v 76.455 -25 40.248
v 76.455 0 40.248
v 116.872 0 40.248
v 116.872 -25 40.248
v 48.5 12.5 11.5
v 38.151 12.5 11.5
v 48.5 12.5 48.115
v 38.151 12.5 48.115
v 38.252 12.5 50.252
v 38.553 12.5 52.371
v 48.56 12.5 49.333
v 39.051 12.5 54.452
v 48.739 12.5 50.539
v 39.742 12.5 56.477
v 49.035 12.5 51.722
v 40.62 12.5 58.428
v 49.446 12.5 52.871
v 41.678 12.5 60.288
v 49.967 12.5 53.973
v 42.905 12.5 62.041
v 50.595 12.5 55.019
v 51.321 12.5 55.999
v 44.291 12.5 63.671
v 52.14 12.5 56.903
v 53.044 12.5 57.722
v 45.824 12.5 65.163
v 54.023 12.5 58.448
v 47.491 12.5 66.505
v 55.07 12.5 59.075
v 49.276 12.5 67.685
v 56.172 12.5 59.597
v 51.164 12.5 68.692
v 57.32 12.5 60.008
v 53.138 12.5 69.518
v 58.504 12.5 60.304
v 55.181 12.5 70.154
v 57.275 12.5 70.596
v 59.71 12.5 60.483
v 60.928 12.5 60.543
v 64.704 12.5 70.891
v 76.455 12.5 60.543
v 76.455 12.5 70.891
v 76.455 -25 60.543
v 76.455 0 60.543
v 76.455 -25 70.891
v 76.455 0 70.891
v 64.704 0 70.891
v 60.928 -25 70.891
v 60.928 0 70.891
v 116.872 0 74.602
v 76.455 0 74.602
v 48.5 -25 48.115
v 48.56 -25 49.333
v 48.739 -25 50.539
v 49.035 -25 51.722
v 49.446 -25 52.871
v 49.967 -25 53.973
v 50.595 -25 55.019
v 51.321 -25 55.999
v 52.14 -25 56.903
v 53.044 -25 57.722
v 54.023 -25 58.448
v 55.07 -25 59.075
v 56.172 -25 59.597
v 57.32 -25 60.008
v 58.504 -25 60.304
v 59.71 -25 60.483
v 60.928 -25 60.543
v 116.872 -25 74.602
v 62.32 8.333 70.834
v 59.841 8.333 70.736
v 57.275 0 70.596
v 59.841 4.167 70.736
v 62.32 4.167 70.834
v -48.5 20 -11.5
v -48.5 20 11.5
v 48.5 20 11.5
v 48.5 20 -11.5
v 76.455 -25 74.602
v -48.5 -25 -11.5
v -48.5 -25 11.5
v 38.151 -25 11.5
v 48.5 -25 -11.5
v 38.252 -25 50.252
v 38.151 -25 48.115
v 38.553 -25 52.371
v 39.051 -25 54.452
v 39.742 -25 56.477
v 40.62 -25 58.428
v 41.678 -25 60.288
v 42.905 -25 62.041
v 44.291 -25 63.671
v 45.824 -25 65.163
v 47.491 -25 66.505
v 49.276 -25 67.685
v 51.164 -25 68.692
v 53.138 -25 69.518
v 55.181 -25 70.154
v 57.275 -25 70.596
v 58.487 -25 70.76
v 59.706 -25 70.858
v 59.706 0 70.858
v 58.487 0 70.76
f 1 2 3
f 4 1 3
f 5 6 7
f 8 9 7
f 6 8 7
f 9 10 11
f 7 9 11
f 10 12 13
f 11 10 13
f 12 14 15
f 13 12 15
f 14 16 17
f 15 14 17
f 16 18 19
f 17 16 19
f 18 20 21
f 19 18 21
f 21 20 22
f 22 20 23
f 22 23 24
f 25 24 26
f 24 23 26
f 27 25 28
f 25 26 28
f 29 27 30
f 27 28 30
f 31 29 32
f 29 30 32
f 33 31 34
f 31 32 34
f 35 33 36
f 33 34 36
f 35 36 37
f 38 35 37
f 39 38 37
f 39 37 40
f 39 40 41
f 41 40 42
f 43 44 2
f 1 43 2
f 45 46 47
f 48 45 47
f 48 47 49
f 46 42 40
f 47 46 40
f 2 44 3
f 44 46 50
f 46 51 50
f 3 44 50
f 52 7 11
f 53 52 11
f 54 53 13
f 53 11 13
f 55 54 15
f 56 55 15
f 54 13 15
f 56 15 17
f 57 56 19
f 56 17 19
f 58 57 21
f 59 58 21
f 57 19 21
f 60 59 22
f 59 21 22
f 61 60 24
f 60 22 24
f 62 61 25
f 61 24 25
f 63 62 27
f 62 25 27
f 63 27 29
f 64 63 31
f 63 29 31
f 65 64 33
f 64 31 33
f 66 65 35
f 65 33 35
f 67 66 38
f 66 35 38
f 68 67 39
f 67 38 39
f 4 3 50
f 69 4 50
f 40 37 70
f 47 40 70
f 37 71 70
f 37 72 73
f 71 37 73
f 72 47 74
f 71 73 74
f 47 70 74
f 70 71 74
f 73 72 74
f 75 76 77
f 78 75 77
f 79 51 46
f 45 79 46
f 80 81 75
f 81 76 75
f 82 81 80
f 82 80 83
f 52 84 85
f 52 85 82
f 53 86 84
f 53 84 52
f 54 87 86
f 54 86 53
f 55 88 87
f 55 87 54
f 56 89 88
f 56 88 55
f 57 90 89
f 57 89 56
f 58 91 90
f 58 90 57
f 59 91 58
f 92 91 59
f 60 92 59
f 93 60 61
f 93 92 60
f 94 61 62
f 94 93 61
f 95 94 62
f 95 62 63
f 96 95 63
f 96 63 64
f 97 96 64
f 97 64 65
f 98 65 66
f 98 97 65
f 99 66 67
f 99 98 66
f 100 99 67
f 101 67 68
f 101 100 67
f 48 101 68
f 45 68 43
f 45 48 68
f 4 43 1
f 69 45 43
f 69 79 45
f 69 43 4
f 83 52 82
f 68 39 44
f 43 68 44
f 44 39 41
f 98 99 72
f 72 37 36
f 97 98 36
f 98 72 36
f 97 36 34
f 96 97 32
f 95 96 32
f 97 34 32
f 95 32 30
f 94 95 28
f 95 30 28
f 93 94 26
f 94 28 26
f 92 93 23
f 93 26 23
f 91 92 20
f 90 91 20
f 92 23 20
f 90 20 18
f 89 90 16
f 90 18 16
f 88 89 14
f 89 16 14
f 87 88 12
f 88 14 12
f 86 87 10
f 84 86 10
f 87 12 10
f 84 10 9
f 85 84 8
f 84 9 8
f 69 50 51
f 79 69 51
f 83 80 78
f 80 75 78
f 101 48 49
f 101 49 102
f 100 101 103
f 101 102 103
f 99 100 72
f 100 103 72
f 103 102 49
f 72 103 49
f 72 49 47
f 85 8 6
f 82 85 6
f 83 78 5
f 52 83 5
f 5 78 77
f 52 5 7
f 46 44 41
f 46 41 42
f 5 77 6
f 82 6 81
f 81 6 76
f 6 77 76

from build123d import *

# Parameters (mm, degrees)
F1_DEPTH = 20
F2_DEPTH = 12.5
F3_DEPTH = 25
F4_DEPTH = 25


with BuildPart() as f1:
    # F0 (on Front) → F1 (new body, symmetric)
    with BuildSketch(Plane.XZ):
        Polygon((48.5, -11.5), (48.5, 11.5), (38.151402, 11.5), (-48.5, 11.5), (-48.5, -11.5), align=None)
    extrude(amount=F1_DEPTH, both=True)

    # F0 (on Front) → F2 (join, symmetric)
    with BuildSketch(Plane.XZ):
        with BuildLine():
            Line((38.151402, 11.5), (48.5, 11.5))
            Line((48.5, 11.5), (48.5, 48.114586))
            ThreePointArc((48.5, 48.114586), (52.140113, 56.902597), (60.928124, 60.54271))
            Line((60.928124, 60.54271), (76.454861, 60.54271))
            Line((76.454861, 60.54271), (76.454861, 70.891308))
            Line((76.454861, 70.891308), (64.704314, 70.891308))
            add(Edge.make_bspline(
                [(57.274692, 70.59639), (59.883301, 70.756612), (62.369155, 70.854308), (64.704314, 70.891308)],
                knots=[119.890309, 119.890309, 119.890309, 119.890309, 127.668117, 127.668117, 127.668117, 127.668117], degree=3))
            ThreePointArc((57.274692, 70.59639), (43.578884, 62.872057), (38.151402, 48.114586))
            Line((38.151402, 48.114586), (38.151402, 11.5))
        make_face()
    extrude(amount=F2_DEPTH, both=True)

    # F0 (on Front) → F3 (join)
    with BuildSketch(Plane.XZ):
        Polygon((48.5, -11.5), (48.5, 11.5), (38.151402, 11.5), (-48.5, 11.5), (-48.5, -11.5), align=None)
        with BuildLine():
            Line((38.151402, 11.5), (48.5, 11.5))
            Line((48.5, 11.5), (48.5, 48.114586))
            ThreePointArc((48.5, 48.114586), (52.140113, 56.902597), (60.928124, 60.54271))
            Line((60.928124, 60.54271), (76.454861, 60.54271))
            Line((76.454861, 60.54271), (76.454861, 70.891308))
            Line((76.454861, 70.891308), (64.704314, 70.891308))
            add(Edge.make_bspline(
                [(57.274692, 70.59639), (59.883301, 70.756612), (62.369155, 70.854308), (64.704314, 70.891308)],
                knots=[119.890309, 119.890309, 119.890309, 119.890309, 127.668117, 127.668117, 127.668117, 127.668117], degree=3))
            ThreePointArc((57.274692, 70.59639), (43.578884, 62.872057), (38.151402, 48.114586))
            Line((38.151402, 48.114586), (38.151402, 11.5))
        make_face()
        with BuildLine():
            ThreePointArc((60.928124, 70.891308), (59.095466, 70.817459), (57.274692, 70.59639))
            add(Edge.make_bspline(
                [(57.274692, 70.59639), (59.883301, 70.756612), (62.369155, 70.854308), (64.704314, 70.891308)],
                knots=[119.890309, 119.890309, 119.890309, 119.890309, 127.668117, 127.668117, 127.668117, 127.668117], degree=3))
            Line((64.704314, 70.891308), (60.928124, 70.891308))
        make_face()
        Polygon((76.454861, 70.891308), (76.454861, 60.54271), (76.454861, 40.248264), (116.871528, 40.248264), (116.871528, 74.602442), (76.454861, 74.602442), align=None)
    extrude(amount=F3_DEPTH)

    # F0 (on Front) → F4 (join)
    with BuildSketch(Plane.XZ):
        Polygon((48.5, -11.5), (48.5, 11.5), (38.151402, 11.5), (-48.5, 11.5), (-48.5, -11.5), align=None)
        with BuildLine():
            Line((38.151402, 11.5), (48.5, 11.5))
            Line((48.5, 11.5), (48.5, 48.114586))
            ThreePointArc((48.5, 48.114586), (52.140113, 56.902597), (60.928124, 60.54271))
            Line((60.928124, 60.54271), (76.454861, 60.54271))
            Line((76.454861, 60.54271), (76.454861, 70.891308))
            Line((76.454861, 70.891308), (64.704314, 70.891308))
            add(Edge.make_bspline(
                [(57.274692, 70.59639), (59.883301, 70.756612), (62.369155, 70.854308), (64.704314, 70.891308)],
                knots=[119.890309, 119.890309, 119.890309, 119.890309, 127.668117, 127.668117, 127.668117, 127.668117], degree=3))
            ThreePointArc((57.274692, 70.59639), (43.578884, 62.872057), (38.151402, 48.114586))
            Line((38.151402, 48.114586), (38.151402, 11.5))
        make_face()
        with BuildLine():
            ThreePointArc((60.928124, 70.891308), (59.095466, 70.817459), (57.274692, 70.59639))
            add(Edge.make_bspline(
                [(57.274692, 70.59639), (59.883301, 70.756612), (62.369155, 70.854308), (64.704314, 70.891308)],
                knots=[119.890309, 119.890309, 119.890309, 119.890309, 127.668117, 127.668117, 127.668117, 127.668117], degree=3))
            Line((64.704314, 70.891308), (60.928124, 70.891308))
        make_face()
        Polygon((76.454861, 70.891308), (76.454861, 60.54271), (76.454861, 40.248264), (116.871528, 40.248264), (116.871528, 74.602442), (76.454861, 74.602442), align=None)
    extrude(amount=F4_DEPTH)


solid = f1.part
